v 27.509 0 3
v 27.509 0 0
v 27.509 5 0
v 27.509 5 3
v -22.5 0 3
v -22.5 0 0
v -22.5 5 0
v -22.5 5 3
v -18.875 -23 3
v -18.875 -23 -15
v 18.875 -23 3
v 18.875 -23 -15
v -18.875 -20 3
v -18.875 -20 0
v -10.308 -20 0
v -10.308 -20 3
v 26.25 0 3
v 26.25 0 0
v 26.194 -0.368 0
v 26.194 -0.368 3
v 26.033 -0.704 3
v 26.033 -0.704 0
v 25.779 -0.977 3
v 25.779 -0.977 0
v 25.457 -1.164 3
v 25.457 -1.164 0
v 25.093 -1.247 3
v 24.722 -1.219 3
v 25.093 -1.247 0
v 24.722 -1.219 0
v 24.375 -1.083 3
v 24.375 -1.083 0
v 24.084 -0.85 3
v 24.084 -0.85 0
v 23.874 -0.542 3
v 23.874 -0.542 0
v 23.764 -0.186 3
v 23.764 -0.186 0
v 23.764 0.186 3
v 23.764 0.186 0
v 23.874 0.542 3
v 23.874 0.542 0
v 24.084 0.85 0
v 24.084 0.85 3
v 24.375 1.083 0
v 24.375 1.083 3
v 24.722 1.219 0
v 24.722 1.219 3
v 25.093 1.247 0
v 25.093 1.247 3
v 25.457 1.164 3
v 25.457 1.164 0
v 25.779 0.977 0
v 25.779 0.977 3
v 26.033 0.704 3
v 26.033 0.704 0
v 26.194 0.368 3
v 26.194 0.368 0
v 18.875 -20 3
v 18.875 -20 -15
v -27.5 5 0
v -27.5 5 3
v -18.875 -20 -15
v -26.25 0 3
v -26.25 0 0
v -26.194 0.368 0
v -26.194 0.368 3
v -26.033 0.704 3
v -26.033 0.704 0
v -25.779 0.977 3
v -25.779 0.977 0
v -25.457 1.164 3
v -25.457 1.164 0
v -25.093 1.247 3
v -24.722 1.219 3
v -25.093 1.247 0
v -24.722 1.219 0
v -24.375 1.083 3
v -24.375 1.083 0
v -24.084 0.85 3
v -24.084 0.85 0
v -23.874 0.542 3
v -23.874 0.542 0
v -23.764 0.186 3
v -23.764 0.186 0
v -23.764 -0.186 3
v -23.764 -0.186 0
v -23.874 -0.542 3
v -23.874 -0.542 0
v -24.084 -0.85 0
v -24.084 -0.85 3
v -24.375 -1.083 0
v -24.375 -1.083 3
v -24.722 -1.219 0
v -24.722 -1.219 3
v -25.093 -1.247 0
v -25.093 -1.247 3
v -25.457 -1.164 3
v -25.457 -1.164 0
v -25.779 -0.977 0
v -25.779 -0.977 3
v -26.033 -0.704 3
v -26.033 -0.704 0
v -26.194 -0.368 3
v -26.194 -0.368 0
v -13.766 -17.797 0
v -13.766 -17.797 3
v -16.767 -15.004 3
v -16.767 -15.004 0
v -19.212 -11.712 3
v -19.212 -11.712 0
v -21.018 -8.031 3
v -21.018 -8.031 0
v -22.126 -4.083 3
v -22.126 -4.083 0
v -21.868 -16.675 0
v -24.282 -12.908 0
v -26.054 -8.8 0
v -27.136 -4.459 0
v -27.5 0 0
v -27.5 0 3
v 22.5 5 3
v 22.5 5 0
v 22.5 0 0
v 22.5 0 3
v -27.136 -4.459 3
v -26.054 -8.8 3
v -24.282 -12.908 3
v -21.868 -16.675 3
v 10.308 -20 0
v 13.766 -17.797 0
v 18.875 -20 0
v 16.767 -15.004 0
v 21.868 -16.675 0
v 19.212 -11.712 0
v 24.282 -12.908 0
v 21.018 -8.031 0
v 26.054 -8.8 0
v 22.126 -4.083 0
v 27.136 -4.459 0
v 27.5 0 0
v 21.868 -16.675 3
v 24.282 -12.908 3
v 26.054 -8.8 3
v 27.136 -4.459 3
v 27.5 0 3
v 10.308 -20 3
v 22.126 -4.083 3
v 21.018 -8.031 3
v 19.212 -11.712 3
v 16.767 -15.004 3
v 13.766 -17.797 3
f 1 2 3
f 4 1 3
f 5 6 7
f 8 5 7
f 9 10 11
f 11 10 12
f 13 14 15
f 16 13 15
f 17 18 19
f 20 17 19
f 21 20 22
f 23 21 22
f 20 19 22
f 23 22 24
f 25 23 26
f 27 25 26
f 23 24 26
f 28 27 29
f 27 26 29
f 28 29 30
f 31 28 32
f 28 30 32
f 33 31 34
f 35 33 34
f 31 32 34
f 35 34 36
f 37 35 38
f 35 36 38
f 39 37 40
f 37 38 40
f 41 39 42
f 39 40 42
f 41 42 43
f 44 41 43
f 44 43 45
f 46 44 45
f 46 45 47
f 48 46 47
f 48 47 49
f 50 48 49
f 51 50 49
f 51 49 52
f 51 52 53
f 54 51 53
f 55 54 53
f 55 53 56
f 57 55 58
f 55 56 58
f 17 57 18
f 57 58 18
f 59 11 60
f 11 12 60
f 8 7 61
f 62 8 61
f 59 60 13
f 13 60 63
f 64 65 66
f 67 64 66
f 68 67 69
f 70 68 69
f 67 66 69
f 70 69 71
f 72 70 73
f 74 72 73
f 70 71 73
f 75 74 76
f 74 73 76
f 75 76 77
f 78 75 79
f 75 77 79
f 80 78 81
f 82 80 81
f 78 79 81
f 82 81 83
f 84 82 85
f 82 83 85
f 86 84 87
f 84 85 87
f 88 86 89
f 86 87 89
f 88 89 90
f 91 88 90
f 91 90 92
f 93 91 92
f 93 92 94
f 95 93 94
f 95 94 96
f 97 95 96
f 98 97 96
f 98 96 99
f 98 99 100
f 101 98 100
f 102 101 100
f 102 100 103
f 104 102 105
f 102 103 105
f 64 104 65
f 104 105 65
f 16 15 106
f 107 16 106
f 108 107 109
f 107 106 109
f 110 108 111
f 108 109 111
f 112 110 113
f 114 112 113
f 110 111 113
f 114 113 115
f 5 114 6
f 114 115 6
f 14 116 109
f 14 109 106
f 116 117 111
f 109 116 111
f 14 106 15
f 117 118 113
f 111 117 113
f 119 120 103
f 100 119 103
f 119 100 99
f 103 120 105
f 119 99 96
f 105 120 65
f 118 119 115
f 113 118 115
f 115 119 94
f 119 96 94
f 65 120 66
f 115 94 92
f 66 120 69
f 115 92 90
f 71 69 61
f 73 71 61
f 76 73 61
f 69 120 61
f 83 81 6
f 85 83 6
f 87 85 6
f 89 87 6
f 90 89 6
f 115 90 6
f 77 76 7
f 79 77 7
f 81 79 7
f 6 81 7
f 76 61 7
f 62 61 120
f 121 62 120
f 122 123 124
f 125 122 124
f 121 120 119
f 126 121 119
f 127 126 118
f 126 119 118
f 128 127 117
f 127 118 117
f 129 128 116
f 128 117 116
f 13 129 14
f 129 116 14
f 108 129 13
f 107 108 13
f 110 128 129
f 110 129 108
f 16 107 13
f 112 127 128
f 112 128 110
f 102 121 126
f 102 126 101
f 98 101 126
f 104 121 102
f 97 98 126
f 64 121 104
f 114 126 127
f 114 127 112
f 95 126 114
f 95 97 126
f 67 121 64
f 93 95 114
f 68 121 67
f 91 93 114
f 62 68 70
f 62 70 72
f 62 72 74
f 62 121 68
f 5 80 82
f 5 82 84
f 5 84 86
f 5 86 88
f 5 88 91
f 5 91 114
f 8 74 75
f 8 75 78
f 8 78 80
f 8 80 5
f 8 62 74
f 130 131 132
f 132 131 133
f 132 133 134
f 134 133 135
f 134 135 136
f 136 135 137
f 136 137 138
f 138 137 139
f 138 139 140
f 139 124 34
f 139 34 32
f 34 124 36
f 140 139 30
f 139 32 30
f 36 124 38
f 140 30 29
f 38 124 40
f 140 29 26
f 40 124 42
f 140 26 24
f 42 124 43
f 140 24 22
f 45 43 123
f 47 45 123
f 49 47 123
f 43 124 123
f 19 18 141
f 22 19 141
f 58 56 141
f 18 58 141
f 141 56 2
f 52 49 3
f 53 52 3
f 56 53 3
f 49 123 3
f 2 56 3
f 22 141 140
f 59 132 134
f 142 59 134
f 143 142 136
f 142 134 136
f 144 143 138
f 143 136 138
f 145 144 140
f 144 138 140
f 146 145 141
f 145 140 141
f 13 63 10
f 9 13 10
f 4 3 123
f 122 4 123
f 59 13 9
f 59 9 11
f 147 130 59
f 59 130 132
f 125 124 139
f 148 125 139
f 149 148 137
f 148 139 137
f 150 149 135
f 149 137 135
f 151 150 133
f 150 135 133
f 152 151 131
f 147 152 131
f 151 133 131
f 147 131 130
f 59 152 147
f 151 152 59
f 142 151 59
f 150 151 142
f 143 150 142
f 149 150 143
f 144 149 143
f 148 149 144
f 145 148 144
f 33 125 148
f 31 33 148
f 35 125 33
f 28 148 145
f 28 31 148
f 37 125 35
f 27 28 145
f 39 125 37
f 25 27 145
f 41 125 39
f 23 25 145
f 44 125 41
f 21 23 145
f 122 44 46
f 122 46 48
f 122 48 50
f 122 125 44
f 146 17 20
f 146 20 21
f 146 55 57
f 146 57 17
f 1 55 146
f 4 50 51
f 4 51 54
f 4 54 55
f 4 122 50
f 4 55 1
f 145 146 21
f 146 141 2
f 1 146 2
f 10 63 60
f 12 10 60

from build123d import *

# Parameters (mm, degrees)
F1_DEPTH      = 3
F2_DEPTH      = 15
F2_DEPTH_BACK = 3


with BuildPart() as f1:
    # F0 (on Top) → F1 (new body)
    with BuildSketch(Plane.XY):
        with BuildLine():
            Line((22.5, 5), (22.5, 0))
            Line((22.5, 0), (23.75, 0))
            ThreePointArc((23.75, 0), (25, 1.25), (26.25, 0))
            Line((26.25, 0), (27.5, 0))
            ThreePointArc((27.5, 0), (27.3851688927, 2.510482965), (27.041634566, 5))
            Line((27.041634566, 5), (22.5, 5))
        make_face()
        with BuildLine():
            Line((27.5094527751, 5), (27.041634566, 5))
            ThreePointArc((27.041634566, 5), (27.3851688927, 2.510482965), (27.5, 0))
            Line((27.5, 0), (27.5094527751, 0))
            Line((27.5094527751, 0), (27.5094527751, 5))
        make_face()
        with BuildLine():
            Line((23.75, 0), (22.5, 0))
            ThreePointArc((22.5, 0), (19.2116460961, -11.7116460961), (10.307764064, -20))
            Line((10.307764064, -20), (18.8745860882, -20))
            ThreePointArc((18.8745860882, -20), (25.2517436767, -10.8903370603), (27.5, 0))
            Line((27.5, 0), (26.25, 0))
            ThreePointArc((26.25, 0), (25, -1.25), (23.75, 0))
        make_face()
    extrude(amount=F1_DEPTH)


with BuildPart() as f1b:
    # F0 (on Top) → F1, piece 2 (new body)
    with BuildSketch(Plane.XY):
        with BuildLine():
            Line((-22.5, 0), (-23.75, 0))
            ThreePointArc((-23.75, 0), (-25, -1.25), (-26.25, 0))
            Line((-26.25, 0), (-27.5, 0))
            ThreePointArc((-27.5, 0), (-25.2517436767, -10.8903370603), (-18.8745860882, -20))
            Line((-18.8745860882, -20), (-10.307764064, -20))
            ThreePointArc((-10.307764064, -20), (-19.2116460961, -11.7116460961), (-22.5, 0))
        make_face()
        with BuildLine():
            ThreePointArc((-26.25, 0), (-25, 1.25), (-23.75, 0))
            Line((-23.75, 0), (-22.5, 0))
            Line((-22.5, 0), (-22.5, 5))
            Line((-22.5, 5), (-27.041634566, 5))
            ThreePointArc((-27.041634566, 5), (-27.3851688927, 2.510482965), (-27.5, 0))
            Line((-27.5, 0), (-26.25, 0))
        make_face()
        with BuildLine():
            Line((-27.5, 5), (-27.5, 0))
            ThreePointArc((-27.5, 0), (-27.3851688927, 2.510482965), (-27.041634566, 5))
            Line((-27.041634566, 5), (-27.5, 5))
        make_face()
    extrude(amount=F1_DEPTH)


with BuildPart() as f2:
    # F0 (on Top) → F2 (new body, two sides)
    with BuildSketch(Plane.XY) as f2_sk:
        with BuildLine():
            ThreePointArc((10.307764064, -20), (0, -22.5), (-10.307764064, -20))
            Line((-10.307764064, -20), (-18.8745860882, -20))
            ThreePointArc((-18.8745860882, -20), (-17.0408459866, -21.5837802078), (-15.0748134317, -23))
            Line((-15.0748134317, -23), (15.0748134317, -23))
            ThreePointArc((15.0748134317, -23), (17.0408459866, -21.5837802078), (18.8745860882, -20))
            Line((18.8745860882, -20), (10.307764064, -20))
        make_face()
        with BuildLine():
            ThreePointArc((-15.0748134317, -23), (-17.0408459866, -21.5837802078), (-18.8745860882, -20))
            Line((-18.8745860882, -20), (-18.8745860882, -23))
            Line((-18.8745860882, -23), (-15.0748134317, -23))
        make_face()
        with BuildLine():
            Line((18.8745860882, -23), (18.8745860882, -20))
            ThreePointArc((18.8745860882, -20), (17.0408459866, -21.5837802078), (15.0748134317, -23))
            Line((15.0748134317, -23), (18.8745860882, -23))
        make_face()
        with BuildLine():
            Line((0, -20), (-10.307764064, -20))
            ThreePointArc((-10.307764064, -20), (0, -22.5), (10.307764064, -20))
            Line((10.307764064, -20), (0, -20))
        make_face()
    extrude(amount=-F2_DEPTH)
    extrude(f2_sk.sketch, amount=F2_DEPTH_BACK)


solid = Compound([f1.part, f1b.part, f2.part])
